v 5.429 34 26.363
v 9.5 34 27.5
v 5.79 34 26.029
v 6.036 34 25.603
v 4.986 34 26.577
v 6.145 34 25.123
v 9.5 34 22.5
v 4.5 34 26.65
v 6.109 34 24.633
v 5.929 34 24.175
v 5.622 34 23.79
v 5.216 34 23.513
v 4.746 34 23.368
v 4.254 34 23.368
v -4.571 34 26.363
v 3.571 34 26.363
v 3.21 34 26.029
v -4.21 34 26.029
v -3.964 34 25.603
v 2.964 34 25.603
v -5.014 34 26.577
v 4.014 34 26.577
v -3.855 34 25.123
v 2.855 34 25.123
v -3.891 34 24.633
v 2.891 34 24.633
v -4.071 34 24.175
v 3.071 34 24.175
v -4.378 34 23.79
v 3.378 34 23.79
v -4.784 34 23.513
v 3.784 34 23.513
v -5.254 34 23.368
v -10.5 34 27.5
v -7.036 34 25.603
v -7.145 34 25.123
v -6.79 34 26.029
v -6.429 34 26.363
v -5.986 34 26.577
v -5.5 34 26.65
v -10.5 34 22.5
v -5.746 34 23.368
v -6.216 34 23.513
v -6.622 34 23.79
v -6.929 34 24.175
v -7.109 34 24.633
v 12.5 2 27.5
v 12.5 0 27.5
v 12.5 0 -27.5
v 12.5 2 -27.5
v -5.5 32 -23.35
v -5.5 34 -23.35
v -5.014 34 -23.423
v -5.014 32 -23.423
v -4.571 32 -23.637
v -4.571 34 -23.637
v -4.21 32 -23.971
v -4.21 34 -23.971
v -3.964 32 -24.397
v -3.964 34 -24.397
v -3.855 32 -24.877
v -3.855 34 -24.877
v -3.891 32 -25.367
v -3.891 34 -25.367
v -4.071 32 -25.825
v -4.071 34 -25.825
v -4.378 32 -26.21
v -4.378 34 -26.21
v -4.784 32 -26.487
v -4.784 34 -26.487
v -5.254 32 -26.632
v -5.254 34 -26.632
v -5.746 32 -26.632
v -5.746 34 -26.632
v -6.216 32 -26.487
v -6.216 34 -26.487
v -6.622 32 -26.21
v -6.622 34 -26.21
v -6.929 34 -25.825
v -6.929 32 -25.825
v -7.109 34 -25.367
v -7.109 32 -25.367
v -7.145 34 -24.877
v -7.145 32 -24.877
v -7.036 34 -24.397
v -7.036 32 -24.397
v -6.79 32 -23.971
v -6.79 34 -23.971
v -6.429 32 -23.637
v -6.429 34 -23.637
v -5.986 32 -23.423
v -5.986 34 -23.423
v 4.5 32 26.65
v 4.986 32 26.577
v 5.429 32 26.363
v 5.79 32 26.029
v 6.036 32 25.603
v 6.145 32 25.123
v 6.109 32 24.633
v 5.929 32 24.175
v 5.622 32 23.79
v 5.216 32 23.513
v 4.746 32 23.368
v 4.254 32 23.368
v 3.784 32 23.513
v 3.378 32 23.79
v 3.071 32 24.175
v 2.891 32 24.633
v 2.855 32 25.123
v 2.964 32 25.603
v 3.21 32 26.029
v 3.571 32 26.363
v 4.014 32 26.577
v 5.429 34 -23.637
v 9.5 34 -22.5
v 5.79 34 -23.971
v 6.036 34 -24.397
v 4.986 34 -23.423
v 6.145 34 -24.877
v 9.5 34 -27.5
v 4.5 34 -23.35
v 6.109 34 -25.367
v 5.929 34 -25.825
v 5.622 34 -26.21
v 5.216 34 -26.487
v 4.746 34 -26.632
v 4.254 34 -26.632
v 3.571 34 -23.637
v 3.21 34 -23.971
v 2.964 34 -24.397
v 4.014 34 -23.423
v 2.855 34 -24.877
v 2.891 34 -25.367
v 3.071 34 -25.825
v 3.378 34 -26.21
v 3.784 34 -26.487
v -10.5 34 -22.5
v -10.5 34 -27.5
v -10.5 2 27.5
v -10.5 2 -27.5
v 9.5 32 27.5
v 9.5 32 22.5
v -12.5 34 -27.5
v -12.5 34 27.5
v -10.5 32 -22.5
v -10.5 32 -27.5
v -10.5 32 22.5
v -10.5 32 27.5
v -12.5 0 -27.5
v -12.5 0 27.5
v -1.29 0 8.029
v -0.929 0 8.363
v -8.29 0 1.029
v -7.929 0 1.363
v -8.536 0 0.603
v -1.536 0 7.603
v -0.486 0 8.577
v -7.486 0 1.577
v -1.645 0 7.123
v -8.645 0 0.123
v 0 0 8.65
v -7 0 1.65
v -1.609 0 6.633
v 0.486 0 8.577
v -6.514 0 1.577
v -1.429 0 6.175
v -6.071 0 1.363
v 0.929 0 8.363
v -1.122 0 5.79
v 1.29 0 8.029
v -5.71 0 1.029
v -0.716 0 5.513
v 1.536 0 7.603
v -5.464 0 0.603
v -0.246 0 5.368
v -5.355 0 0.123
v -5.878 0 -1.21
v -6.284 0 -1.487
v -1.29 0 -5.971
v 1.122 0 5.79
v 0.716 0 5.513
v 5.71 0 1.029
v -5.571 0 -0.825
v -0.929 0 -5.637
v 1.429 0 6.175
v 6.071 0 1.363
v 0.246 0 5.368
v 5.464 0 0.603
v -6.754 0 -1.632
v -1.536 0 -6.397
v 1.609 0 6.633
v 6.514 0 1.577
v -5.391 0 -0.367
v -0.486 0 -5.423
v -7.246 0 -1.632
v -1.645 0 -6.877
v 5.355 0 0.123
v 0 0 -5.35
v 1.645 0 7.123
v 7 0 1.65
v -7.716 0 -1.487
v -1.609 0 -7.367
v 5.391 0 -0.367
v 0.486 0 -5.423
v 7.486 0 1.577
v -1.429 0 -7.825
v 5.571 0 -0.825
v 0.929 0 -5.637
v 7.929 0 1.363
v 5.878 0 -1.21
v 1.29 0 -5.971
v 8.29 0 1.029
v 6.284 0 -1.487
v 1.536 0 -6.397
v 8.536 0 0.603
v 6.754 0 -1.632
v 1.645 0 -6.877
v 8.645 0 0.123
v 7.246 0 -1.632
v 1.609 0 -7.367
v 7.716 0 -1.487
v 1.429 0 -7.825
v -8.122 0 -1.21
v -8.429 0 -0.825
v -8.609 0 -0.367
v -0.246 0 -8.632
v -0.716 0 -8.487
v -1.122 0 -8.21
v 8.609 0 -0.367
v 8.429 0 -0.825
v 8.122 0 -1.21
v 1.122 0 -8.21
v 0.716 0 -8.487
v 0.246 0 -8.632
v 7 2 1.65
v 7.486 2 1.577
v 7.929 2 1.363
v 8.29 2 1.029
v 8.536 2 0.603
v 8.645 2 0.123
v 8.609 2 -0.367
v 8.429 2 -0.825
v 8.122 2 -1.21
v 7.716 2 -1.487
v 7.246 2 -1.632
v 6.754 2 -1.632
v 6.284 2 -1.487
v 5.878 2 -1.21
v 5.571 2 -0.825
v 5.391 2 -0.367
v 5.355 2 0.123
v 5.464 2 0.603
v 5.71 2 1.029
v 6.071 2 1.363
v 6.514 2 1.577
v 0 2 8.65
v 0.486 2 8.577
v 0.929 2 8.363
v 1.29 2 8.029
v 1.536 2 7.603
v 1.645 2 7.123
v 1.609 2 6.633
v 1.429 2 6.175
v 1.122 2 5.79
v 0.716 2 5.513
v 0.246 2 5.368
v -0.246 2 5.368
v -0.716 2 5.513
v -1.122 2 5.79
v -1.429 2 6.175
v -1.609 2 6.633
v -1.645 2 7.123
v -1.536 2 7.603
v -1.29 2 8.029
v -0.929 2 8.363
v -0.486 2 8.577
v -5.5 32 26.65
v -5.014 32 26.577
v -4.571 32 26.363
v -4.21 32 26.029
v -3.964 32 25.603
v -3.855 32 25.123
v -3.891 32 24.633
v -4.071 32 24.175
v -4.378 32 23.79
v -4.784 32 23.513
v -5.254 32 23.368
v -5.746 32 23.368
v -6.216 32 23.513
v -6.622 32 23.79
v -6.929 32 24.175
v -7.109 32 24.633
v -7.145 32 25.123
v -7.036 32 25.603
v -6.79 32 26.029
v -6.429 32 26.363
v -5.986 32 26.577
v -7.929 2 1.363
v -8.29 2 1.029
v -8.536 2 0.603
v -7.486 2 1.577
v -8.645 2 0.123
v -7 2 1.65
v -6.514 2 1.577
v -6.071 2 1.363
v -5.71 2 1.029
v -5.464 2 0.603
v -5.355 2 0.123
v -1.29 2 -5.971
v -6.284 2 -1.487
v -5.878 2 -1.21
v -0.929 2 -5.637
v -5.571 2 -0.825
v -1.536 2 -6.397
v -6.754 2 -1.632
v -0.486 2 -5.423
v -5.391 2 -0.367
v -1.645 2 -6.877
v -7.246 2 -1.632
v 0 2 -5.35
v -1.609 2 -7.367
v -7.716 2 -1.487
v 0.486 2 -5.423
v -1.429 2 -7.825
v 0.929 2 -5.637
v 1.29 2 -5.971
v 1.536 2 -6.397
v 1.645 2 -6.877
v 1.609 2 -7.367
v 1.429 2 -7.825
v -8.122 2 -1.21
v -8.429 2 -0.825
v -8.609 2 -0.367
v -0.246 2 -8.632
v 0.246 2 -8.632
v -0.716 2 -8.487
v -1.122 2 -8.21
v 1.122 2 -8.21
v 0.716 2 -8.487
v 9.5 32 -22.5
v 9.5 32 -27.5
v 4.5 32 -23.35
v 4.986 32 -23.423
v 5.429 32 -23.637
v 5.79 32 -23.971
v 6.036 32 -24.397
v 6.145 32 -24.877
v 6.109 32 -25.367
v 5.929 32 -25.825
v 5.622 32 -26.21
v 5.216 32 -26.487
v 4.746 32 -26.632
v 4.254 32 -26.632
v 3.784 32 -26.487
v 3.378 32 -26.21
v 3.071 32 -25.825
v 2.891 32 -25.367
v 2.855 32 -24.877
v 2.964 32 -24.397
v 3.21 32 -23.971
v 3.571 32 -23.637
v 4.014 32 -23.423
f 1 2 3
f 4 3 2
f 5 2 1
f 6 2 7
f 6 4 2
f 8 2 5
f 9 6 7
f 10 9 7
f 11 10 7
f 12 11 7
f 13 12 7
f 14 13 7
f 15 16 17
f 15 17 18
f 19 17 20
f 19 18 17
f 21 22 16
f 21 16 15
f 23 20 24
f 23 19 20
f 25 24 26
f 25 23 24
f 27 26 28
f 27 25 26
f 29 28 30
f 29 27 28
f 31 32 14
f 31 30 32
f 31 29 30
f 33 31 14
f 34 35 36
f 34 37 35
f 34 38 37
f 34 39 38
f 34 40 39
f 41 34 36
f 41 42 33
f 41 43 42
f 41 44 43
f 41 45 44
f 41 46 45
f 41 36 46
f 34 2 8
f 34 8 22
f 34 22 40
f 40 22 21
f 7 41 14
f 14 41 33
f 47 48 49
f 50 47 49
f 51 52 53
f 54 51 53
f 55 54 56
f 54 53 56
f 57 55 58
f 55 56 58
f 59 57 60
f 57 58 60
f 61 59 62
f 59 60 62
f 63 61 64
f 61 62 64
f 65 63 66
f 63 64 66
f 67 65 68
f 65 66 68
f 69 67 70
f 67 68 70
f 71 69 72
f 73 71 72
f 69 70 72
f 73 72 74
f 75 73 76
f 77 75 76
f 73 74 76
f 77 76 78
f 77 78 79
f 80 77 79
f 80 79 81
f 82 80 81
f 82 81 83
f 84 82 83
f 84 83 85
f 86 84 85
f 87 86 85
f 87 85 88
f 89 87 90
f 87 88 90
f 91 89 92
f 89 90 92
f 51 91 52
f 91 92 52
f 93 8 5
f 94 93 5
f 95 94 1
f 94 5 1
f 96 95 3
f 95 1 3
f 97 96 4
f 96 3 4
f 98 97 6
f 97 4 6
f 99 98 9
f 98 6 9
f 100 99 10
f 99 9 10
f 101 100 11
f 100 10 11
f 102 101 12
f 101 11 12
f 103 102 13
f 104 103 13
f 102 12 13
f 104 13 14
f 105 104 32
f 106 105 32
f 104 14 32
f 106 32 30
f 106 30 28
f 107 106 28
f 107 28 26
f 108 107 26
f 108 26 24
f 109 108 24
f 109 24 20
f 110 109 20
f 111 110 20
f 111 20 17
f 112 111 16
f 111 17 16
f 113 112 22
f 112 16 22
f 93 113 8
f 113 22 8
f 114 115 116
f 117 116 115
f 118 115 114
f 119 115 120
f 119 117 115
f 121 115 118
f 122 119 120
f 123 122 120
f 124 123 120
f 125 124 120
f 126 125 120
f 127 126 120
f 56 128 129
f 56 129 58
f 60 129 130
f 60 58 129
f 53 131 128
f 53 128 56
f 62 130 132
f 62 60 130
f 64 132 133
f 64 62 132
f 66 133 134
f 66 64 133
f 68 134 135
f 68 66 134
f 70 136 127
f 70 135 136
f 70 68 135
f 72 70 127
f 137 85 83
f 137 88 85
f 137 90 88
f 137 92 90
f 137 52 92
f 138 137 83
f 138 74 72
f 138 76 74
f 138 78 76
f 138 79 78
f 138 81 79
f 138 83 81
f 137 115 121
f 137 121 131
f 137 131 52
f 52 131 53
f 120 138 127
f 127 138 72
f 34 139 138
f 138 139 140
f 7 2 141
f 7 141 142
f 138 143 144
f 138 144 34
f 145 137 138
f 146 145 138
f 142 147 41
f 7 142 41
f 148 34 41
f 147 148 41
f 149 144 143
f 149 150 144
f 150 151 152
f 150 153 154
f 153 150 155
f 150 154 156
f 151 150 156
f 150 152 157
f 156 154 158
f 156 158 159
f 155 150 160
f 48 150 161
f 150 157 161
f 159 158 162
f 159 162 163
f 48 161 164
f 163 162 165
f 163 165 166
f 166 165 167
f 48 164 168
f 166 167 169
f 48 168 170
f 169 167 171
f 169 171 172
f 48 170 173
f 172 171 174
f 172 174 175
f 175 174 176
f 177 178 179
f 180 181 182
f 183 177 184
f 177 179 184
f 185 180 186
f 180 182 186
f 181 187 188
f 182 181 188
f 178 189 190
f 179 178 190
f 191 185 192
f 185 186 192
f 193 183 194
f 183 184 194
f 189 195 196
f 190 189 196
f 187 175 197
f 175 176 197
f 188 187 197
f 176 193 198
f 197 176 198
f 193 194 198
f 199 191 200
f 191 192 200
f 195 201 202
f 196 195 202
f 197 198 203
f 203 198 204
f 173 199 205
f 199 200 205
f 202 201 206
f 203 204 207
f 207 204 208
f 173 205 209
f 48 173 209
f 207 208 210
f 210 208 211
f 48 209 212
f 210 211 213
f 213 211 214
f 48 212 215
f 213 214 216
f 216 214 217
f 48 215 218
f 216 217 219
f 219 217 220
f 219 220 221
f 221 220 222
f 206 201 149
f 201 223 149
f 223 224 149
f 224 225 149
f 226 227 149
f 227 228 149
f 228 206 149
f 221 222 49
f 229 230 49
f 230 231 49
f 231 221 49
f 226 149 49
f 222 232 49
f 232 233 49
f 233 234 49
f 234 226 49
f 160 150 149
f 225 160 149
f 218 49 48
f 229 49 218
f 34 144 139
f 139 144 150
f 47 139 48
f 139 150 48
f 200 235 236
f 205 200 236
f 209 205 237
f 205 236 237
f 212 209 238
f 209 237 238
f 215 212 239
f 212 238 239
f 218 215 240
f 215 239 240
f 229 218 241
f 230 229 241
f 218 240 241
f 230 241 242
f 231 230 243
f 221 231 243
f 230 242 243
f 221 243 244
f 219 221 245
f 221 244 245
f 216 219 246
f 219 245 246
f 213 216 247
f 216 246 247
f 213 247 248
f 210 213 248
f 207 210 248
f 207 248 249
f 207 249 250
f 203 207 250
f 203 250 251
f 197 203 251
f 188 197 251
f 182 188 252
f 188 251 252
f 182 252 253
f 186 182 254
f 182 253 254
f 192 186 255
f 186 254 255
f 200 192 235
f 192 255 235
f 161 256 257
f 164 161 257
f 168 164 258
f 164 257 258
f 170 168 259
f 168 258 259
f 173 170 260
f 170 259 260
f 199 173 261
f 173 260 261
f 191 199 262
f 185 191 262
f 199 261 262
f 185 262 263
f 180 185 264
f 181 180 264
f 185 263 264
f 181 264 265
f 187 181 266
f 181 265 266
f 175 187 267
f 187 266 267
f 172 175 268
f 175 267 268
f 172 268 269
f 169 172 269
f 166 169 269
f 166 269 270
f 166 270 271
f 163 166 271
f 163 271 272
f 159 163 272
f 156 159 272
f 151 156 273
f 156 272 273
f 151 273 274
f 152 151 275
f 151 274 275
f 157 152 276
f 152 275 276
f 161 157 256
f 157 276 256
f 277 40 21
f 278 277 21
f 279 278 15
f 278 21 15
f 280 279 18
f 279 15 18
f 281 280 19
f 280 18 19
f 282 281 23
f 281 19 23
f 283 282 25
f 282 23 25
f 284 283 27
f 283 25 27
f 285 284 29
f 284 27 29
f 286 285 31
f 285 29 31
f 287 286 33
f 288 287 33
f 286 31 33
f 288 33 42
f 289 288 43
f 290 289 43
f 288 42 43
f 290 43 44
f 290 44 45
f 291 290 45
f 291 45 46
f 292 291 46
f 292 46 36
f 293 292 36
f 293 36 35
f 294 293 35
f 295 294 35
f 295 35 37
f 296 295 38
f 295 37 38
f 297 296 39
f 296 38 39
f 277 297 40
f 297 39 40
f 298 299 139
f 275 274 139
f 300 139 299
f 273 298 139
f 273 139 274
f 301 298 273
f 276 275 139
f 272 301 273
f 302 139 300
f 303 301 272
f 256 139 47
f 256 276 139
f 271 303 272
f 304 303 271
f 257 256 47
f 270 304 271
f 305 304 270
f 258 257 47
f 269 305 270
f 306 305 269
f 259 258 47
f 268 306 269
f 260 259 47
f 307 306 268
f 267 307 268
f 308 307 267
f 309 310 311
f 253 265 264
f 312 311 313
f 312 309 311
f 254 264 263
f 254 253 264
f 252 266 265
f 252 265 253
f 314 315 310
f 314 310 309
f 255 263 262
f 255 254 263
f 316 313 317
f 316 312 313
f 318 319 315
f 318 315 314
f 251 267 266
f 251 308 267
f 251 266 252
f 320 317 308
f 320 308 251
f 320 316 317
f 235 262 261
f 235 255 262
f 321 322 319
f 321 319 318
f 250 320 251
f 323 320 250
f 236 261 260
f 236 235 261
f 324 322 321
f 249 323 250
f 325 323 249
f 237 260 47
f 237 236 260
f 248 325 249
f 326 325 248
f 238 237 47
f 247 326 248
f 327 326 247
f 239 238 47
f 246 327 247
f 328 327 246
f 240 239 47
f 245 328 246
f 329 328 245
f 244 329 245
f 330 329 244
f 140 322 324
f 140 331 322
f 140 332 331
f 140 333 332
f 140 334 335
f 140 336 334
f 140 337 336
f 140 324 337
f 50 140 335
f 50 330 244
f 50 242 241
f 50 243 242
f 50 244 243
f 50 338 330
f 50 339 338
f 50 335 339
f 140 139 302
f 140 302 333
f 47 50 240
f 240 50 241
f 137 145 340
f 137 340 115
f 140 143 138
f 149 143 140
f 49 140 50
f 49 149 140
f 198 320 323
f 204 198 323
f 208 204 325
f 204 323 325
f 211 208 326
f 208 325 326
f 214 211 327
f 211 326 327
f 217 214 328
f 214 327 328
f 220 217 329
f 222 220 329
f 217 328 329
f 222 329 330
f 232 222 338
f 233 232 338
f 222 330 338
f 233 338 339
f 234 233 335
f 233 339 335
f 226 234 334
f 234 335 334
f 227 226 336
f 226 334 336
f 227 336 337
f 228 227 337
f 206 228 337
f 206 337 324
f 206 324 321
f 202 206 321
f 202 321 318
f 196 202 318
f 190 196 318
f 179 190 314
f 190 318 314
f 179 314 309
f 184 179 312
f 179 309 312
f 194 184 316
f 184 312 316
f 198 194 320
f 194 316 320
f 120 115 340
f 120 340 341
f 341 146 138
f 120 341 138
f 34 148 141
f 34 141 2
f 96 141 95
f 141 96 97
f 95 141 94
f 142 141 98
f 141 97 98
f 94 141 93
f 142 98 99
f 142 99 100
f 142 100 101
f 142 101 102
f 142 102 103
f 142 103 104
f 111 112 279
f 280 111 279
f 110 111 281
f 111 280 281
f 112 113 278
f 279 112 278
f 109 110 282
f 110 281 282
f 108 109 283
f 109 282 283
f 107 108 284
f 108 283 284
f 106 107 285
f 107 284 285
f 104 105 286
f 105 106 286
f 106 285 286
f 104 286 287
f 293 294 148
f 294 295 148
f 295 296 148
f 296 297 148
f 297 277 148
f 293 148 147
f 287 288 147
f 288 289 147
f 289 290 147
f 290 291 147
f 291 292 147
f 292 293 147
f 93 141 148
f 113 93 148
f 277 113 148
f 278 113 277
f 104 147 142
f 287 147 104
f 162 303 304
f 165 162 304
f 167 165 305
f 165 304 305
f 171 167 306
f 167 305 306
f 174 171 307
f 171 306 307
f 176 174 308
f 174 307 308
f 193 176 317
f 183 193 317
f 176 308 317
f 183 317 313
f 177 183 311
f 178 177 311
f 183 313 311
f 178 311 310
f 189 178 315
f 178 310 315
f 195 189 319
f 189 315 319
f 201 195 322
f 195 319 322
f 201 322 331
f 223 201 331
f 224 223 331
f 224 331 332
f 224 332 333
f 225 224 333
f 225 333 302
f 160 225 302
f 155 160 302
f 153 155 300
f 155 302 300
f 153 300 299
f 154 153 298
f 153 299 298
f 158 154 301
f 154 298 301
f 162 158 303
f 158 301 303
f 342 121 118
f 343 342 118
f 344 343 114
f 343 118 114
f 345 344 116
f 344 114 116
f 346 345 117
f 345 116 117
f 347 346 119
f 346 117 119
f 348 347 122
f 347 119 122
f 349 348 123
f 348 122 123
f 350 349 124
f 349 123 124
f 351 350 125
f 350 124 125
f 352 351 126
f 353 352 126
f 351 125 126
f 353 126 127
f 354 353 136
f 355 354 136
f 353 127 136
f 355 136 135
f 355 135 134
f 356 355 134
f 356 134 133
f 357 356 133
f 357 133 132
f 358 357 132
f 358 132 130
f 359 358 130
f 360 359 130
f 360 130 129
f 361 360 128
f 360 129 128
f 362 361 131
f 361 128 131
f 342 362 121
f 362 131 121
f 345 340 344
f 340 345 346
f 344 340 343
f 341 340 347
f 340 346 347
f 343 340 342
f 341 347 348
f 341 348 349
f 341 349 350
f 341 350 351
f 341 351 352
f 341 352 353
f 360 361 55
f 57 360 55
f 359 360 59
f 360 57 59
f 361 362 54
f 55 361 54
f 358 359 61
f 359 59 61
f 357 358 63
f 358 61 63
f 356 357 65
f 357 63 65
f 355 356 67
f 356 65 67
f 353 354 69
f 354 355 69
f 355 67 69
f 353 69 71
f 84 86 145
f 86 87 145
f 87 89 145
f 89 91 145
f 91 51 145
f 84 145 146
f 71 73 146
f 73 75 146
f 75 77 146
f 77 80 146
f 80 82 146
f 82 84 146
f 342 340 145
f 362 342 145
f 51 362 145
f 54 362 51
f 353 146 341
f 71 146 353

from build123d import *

# Parameters (mm, degrees)
SKETCH_1_W          = 25
SKETCH_1_H          = 55
EXTRUDE_1_DEPTH     = 2
SKETCH_2_R          = 1.65
CUT_EXTRUDE_1_DEPTH = 2
SKETCH_3_W          = 2
SKETCH_3_H          = 55
EXTRUDE_2_DEPTH     = 32
SKETCH_4_W          = 5
SKETCH_4_H          = 2
EXTRUDE_3_DEPTH     = 20
EXTRUDE_3_2_DEPTH   = 20
SKETCH_5_R          = 1.65
CUT_EXTRUDE_2_DEPTH = 2


with BuildPart() as part:
    # 草图1 → 凸台-拉伸1 (new body)
    with BuildSketch(Plane(origin=(0, 0, 0), x_dir=(1, 0, 0), z_dir=(0, 1, 0))):
        Rectangle(SKETCH_1_W, SKETCH_1_H)
    extrude(amount=EXTRUDE_1_DEPTH)

    # 草图2 → 切除-拉伸1 (cut)
    with BuildSketch(Plane(origin=(0, 2, 0), x_dir=(1, 0, 0), z_dir=(0, 1, 0))):
        with Locations(Location((7, 0, 0), (0, 0, 270))):
            Circle(SKETCH_2_R)
        with Locations(Location((0, 7, 0), (0, 0, 270))):
            Circle(SKETCH_2_R)
        with Locations(Location((-7, 0, 0), (0, 0, 270))):
            Circle(SKETCH_2_R)
        with Locations(Location((0, -7, 0), (0, 0, 270))):
            Circle(SKETCH_2_R)
    extrude(amount=-CUT_EXTRUDE_1_DEPTH, mode=Mode.SUBTRACT)

    # 草图3 → 凸台-拉伸2 (add)
    with BuildSketch(Plane(origin=(0, 2, 0), x_dir=(1, 0, 0), z_dir=(0, 1, 0))):
        with Locations((-11.5, 0)):
            Rectangle(SKETCH_3_W, SKETCH_3_H)
    extrude(amount=EXTRUDE_2_DEPTH)


with BuildPart() as body_2:
    # 草图4 → 凸台-拉伸3 (new body)
    with BuildSketch(Plane(origin=(-10.5, 0, 0), x_dir=(0, 0, -1), z_dir=(1, 0, 0))):
        with Locations((25, 33)):
            Rectangle(SKETCH_4_W, SKETCH_4_H)
    extrude(amount=EXTRUDE_3_DEPTH)


with BuildPart() as body_3:
    # 草图4 → Extrude 3 2 (new body)
    with BuildSketch(Plane(origin=(-10.5, 0, 0), x_dir=(0, 0, -1), z_dir=(1, 0, 0))):
        with Locations((-25, 33)):
            Rectangle(SKETCH_4_W, SKETCH_4_H)
    extrude(amount=EXTRUDE_3_2_DEPTH)


with BuildPart() as cut_extrude_2_tool:
    # 草图5 → 切除-拉伸2 (new body)
    with BuildSketch(Plane(origin=(0, 34, 0), x_dir=(1, 0, 0), z_dir=(0, 1, 0))):
        with Locations(Location((-5.5, -25, 0), (0, 0, 270))):
            Circle(SKETCH_5_R)
        with Locations(Location((4.5, -25, 0), (0, 0, 270))):
            Circle(SKETCH_5_R)
        with Locations(Location((4.5, 25, 0), (0, 0, 270))):
            Circle(SKETCH_5_R)
        with Locations(Location((-5.5, 25, 0), (0, 0, 270))):
            Circle(SKETCH_5_R)
    extrude(amount=-CUT_EXTRUDE_2_DEPTH)


with BuildPart() as body_2_1:
    add(body_2.part)

    # 切除-拉伸2: cut by cut_extrude_2_tool
    add(cut_extrude_2_tool.part, mode=Mode.SUBTRACT)


with BuildPart() as body_3_1:
    add(body_3.part)

    # 切除-拉伸2: cut by cut_extrude_2_tool
    add(cut_extrude_2_tool.part, mode=Mode.SUBTRACT)


solid = Compound([part.part, body_2_1.part, body_3_1.part])
